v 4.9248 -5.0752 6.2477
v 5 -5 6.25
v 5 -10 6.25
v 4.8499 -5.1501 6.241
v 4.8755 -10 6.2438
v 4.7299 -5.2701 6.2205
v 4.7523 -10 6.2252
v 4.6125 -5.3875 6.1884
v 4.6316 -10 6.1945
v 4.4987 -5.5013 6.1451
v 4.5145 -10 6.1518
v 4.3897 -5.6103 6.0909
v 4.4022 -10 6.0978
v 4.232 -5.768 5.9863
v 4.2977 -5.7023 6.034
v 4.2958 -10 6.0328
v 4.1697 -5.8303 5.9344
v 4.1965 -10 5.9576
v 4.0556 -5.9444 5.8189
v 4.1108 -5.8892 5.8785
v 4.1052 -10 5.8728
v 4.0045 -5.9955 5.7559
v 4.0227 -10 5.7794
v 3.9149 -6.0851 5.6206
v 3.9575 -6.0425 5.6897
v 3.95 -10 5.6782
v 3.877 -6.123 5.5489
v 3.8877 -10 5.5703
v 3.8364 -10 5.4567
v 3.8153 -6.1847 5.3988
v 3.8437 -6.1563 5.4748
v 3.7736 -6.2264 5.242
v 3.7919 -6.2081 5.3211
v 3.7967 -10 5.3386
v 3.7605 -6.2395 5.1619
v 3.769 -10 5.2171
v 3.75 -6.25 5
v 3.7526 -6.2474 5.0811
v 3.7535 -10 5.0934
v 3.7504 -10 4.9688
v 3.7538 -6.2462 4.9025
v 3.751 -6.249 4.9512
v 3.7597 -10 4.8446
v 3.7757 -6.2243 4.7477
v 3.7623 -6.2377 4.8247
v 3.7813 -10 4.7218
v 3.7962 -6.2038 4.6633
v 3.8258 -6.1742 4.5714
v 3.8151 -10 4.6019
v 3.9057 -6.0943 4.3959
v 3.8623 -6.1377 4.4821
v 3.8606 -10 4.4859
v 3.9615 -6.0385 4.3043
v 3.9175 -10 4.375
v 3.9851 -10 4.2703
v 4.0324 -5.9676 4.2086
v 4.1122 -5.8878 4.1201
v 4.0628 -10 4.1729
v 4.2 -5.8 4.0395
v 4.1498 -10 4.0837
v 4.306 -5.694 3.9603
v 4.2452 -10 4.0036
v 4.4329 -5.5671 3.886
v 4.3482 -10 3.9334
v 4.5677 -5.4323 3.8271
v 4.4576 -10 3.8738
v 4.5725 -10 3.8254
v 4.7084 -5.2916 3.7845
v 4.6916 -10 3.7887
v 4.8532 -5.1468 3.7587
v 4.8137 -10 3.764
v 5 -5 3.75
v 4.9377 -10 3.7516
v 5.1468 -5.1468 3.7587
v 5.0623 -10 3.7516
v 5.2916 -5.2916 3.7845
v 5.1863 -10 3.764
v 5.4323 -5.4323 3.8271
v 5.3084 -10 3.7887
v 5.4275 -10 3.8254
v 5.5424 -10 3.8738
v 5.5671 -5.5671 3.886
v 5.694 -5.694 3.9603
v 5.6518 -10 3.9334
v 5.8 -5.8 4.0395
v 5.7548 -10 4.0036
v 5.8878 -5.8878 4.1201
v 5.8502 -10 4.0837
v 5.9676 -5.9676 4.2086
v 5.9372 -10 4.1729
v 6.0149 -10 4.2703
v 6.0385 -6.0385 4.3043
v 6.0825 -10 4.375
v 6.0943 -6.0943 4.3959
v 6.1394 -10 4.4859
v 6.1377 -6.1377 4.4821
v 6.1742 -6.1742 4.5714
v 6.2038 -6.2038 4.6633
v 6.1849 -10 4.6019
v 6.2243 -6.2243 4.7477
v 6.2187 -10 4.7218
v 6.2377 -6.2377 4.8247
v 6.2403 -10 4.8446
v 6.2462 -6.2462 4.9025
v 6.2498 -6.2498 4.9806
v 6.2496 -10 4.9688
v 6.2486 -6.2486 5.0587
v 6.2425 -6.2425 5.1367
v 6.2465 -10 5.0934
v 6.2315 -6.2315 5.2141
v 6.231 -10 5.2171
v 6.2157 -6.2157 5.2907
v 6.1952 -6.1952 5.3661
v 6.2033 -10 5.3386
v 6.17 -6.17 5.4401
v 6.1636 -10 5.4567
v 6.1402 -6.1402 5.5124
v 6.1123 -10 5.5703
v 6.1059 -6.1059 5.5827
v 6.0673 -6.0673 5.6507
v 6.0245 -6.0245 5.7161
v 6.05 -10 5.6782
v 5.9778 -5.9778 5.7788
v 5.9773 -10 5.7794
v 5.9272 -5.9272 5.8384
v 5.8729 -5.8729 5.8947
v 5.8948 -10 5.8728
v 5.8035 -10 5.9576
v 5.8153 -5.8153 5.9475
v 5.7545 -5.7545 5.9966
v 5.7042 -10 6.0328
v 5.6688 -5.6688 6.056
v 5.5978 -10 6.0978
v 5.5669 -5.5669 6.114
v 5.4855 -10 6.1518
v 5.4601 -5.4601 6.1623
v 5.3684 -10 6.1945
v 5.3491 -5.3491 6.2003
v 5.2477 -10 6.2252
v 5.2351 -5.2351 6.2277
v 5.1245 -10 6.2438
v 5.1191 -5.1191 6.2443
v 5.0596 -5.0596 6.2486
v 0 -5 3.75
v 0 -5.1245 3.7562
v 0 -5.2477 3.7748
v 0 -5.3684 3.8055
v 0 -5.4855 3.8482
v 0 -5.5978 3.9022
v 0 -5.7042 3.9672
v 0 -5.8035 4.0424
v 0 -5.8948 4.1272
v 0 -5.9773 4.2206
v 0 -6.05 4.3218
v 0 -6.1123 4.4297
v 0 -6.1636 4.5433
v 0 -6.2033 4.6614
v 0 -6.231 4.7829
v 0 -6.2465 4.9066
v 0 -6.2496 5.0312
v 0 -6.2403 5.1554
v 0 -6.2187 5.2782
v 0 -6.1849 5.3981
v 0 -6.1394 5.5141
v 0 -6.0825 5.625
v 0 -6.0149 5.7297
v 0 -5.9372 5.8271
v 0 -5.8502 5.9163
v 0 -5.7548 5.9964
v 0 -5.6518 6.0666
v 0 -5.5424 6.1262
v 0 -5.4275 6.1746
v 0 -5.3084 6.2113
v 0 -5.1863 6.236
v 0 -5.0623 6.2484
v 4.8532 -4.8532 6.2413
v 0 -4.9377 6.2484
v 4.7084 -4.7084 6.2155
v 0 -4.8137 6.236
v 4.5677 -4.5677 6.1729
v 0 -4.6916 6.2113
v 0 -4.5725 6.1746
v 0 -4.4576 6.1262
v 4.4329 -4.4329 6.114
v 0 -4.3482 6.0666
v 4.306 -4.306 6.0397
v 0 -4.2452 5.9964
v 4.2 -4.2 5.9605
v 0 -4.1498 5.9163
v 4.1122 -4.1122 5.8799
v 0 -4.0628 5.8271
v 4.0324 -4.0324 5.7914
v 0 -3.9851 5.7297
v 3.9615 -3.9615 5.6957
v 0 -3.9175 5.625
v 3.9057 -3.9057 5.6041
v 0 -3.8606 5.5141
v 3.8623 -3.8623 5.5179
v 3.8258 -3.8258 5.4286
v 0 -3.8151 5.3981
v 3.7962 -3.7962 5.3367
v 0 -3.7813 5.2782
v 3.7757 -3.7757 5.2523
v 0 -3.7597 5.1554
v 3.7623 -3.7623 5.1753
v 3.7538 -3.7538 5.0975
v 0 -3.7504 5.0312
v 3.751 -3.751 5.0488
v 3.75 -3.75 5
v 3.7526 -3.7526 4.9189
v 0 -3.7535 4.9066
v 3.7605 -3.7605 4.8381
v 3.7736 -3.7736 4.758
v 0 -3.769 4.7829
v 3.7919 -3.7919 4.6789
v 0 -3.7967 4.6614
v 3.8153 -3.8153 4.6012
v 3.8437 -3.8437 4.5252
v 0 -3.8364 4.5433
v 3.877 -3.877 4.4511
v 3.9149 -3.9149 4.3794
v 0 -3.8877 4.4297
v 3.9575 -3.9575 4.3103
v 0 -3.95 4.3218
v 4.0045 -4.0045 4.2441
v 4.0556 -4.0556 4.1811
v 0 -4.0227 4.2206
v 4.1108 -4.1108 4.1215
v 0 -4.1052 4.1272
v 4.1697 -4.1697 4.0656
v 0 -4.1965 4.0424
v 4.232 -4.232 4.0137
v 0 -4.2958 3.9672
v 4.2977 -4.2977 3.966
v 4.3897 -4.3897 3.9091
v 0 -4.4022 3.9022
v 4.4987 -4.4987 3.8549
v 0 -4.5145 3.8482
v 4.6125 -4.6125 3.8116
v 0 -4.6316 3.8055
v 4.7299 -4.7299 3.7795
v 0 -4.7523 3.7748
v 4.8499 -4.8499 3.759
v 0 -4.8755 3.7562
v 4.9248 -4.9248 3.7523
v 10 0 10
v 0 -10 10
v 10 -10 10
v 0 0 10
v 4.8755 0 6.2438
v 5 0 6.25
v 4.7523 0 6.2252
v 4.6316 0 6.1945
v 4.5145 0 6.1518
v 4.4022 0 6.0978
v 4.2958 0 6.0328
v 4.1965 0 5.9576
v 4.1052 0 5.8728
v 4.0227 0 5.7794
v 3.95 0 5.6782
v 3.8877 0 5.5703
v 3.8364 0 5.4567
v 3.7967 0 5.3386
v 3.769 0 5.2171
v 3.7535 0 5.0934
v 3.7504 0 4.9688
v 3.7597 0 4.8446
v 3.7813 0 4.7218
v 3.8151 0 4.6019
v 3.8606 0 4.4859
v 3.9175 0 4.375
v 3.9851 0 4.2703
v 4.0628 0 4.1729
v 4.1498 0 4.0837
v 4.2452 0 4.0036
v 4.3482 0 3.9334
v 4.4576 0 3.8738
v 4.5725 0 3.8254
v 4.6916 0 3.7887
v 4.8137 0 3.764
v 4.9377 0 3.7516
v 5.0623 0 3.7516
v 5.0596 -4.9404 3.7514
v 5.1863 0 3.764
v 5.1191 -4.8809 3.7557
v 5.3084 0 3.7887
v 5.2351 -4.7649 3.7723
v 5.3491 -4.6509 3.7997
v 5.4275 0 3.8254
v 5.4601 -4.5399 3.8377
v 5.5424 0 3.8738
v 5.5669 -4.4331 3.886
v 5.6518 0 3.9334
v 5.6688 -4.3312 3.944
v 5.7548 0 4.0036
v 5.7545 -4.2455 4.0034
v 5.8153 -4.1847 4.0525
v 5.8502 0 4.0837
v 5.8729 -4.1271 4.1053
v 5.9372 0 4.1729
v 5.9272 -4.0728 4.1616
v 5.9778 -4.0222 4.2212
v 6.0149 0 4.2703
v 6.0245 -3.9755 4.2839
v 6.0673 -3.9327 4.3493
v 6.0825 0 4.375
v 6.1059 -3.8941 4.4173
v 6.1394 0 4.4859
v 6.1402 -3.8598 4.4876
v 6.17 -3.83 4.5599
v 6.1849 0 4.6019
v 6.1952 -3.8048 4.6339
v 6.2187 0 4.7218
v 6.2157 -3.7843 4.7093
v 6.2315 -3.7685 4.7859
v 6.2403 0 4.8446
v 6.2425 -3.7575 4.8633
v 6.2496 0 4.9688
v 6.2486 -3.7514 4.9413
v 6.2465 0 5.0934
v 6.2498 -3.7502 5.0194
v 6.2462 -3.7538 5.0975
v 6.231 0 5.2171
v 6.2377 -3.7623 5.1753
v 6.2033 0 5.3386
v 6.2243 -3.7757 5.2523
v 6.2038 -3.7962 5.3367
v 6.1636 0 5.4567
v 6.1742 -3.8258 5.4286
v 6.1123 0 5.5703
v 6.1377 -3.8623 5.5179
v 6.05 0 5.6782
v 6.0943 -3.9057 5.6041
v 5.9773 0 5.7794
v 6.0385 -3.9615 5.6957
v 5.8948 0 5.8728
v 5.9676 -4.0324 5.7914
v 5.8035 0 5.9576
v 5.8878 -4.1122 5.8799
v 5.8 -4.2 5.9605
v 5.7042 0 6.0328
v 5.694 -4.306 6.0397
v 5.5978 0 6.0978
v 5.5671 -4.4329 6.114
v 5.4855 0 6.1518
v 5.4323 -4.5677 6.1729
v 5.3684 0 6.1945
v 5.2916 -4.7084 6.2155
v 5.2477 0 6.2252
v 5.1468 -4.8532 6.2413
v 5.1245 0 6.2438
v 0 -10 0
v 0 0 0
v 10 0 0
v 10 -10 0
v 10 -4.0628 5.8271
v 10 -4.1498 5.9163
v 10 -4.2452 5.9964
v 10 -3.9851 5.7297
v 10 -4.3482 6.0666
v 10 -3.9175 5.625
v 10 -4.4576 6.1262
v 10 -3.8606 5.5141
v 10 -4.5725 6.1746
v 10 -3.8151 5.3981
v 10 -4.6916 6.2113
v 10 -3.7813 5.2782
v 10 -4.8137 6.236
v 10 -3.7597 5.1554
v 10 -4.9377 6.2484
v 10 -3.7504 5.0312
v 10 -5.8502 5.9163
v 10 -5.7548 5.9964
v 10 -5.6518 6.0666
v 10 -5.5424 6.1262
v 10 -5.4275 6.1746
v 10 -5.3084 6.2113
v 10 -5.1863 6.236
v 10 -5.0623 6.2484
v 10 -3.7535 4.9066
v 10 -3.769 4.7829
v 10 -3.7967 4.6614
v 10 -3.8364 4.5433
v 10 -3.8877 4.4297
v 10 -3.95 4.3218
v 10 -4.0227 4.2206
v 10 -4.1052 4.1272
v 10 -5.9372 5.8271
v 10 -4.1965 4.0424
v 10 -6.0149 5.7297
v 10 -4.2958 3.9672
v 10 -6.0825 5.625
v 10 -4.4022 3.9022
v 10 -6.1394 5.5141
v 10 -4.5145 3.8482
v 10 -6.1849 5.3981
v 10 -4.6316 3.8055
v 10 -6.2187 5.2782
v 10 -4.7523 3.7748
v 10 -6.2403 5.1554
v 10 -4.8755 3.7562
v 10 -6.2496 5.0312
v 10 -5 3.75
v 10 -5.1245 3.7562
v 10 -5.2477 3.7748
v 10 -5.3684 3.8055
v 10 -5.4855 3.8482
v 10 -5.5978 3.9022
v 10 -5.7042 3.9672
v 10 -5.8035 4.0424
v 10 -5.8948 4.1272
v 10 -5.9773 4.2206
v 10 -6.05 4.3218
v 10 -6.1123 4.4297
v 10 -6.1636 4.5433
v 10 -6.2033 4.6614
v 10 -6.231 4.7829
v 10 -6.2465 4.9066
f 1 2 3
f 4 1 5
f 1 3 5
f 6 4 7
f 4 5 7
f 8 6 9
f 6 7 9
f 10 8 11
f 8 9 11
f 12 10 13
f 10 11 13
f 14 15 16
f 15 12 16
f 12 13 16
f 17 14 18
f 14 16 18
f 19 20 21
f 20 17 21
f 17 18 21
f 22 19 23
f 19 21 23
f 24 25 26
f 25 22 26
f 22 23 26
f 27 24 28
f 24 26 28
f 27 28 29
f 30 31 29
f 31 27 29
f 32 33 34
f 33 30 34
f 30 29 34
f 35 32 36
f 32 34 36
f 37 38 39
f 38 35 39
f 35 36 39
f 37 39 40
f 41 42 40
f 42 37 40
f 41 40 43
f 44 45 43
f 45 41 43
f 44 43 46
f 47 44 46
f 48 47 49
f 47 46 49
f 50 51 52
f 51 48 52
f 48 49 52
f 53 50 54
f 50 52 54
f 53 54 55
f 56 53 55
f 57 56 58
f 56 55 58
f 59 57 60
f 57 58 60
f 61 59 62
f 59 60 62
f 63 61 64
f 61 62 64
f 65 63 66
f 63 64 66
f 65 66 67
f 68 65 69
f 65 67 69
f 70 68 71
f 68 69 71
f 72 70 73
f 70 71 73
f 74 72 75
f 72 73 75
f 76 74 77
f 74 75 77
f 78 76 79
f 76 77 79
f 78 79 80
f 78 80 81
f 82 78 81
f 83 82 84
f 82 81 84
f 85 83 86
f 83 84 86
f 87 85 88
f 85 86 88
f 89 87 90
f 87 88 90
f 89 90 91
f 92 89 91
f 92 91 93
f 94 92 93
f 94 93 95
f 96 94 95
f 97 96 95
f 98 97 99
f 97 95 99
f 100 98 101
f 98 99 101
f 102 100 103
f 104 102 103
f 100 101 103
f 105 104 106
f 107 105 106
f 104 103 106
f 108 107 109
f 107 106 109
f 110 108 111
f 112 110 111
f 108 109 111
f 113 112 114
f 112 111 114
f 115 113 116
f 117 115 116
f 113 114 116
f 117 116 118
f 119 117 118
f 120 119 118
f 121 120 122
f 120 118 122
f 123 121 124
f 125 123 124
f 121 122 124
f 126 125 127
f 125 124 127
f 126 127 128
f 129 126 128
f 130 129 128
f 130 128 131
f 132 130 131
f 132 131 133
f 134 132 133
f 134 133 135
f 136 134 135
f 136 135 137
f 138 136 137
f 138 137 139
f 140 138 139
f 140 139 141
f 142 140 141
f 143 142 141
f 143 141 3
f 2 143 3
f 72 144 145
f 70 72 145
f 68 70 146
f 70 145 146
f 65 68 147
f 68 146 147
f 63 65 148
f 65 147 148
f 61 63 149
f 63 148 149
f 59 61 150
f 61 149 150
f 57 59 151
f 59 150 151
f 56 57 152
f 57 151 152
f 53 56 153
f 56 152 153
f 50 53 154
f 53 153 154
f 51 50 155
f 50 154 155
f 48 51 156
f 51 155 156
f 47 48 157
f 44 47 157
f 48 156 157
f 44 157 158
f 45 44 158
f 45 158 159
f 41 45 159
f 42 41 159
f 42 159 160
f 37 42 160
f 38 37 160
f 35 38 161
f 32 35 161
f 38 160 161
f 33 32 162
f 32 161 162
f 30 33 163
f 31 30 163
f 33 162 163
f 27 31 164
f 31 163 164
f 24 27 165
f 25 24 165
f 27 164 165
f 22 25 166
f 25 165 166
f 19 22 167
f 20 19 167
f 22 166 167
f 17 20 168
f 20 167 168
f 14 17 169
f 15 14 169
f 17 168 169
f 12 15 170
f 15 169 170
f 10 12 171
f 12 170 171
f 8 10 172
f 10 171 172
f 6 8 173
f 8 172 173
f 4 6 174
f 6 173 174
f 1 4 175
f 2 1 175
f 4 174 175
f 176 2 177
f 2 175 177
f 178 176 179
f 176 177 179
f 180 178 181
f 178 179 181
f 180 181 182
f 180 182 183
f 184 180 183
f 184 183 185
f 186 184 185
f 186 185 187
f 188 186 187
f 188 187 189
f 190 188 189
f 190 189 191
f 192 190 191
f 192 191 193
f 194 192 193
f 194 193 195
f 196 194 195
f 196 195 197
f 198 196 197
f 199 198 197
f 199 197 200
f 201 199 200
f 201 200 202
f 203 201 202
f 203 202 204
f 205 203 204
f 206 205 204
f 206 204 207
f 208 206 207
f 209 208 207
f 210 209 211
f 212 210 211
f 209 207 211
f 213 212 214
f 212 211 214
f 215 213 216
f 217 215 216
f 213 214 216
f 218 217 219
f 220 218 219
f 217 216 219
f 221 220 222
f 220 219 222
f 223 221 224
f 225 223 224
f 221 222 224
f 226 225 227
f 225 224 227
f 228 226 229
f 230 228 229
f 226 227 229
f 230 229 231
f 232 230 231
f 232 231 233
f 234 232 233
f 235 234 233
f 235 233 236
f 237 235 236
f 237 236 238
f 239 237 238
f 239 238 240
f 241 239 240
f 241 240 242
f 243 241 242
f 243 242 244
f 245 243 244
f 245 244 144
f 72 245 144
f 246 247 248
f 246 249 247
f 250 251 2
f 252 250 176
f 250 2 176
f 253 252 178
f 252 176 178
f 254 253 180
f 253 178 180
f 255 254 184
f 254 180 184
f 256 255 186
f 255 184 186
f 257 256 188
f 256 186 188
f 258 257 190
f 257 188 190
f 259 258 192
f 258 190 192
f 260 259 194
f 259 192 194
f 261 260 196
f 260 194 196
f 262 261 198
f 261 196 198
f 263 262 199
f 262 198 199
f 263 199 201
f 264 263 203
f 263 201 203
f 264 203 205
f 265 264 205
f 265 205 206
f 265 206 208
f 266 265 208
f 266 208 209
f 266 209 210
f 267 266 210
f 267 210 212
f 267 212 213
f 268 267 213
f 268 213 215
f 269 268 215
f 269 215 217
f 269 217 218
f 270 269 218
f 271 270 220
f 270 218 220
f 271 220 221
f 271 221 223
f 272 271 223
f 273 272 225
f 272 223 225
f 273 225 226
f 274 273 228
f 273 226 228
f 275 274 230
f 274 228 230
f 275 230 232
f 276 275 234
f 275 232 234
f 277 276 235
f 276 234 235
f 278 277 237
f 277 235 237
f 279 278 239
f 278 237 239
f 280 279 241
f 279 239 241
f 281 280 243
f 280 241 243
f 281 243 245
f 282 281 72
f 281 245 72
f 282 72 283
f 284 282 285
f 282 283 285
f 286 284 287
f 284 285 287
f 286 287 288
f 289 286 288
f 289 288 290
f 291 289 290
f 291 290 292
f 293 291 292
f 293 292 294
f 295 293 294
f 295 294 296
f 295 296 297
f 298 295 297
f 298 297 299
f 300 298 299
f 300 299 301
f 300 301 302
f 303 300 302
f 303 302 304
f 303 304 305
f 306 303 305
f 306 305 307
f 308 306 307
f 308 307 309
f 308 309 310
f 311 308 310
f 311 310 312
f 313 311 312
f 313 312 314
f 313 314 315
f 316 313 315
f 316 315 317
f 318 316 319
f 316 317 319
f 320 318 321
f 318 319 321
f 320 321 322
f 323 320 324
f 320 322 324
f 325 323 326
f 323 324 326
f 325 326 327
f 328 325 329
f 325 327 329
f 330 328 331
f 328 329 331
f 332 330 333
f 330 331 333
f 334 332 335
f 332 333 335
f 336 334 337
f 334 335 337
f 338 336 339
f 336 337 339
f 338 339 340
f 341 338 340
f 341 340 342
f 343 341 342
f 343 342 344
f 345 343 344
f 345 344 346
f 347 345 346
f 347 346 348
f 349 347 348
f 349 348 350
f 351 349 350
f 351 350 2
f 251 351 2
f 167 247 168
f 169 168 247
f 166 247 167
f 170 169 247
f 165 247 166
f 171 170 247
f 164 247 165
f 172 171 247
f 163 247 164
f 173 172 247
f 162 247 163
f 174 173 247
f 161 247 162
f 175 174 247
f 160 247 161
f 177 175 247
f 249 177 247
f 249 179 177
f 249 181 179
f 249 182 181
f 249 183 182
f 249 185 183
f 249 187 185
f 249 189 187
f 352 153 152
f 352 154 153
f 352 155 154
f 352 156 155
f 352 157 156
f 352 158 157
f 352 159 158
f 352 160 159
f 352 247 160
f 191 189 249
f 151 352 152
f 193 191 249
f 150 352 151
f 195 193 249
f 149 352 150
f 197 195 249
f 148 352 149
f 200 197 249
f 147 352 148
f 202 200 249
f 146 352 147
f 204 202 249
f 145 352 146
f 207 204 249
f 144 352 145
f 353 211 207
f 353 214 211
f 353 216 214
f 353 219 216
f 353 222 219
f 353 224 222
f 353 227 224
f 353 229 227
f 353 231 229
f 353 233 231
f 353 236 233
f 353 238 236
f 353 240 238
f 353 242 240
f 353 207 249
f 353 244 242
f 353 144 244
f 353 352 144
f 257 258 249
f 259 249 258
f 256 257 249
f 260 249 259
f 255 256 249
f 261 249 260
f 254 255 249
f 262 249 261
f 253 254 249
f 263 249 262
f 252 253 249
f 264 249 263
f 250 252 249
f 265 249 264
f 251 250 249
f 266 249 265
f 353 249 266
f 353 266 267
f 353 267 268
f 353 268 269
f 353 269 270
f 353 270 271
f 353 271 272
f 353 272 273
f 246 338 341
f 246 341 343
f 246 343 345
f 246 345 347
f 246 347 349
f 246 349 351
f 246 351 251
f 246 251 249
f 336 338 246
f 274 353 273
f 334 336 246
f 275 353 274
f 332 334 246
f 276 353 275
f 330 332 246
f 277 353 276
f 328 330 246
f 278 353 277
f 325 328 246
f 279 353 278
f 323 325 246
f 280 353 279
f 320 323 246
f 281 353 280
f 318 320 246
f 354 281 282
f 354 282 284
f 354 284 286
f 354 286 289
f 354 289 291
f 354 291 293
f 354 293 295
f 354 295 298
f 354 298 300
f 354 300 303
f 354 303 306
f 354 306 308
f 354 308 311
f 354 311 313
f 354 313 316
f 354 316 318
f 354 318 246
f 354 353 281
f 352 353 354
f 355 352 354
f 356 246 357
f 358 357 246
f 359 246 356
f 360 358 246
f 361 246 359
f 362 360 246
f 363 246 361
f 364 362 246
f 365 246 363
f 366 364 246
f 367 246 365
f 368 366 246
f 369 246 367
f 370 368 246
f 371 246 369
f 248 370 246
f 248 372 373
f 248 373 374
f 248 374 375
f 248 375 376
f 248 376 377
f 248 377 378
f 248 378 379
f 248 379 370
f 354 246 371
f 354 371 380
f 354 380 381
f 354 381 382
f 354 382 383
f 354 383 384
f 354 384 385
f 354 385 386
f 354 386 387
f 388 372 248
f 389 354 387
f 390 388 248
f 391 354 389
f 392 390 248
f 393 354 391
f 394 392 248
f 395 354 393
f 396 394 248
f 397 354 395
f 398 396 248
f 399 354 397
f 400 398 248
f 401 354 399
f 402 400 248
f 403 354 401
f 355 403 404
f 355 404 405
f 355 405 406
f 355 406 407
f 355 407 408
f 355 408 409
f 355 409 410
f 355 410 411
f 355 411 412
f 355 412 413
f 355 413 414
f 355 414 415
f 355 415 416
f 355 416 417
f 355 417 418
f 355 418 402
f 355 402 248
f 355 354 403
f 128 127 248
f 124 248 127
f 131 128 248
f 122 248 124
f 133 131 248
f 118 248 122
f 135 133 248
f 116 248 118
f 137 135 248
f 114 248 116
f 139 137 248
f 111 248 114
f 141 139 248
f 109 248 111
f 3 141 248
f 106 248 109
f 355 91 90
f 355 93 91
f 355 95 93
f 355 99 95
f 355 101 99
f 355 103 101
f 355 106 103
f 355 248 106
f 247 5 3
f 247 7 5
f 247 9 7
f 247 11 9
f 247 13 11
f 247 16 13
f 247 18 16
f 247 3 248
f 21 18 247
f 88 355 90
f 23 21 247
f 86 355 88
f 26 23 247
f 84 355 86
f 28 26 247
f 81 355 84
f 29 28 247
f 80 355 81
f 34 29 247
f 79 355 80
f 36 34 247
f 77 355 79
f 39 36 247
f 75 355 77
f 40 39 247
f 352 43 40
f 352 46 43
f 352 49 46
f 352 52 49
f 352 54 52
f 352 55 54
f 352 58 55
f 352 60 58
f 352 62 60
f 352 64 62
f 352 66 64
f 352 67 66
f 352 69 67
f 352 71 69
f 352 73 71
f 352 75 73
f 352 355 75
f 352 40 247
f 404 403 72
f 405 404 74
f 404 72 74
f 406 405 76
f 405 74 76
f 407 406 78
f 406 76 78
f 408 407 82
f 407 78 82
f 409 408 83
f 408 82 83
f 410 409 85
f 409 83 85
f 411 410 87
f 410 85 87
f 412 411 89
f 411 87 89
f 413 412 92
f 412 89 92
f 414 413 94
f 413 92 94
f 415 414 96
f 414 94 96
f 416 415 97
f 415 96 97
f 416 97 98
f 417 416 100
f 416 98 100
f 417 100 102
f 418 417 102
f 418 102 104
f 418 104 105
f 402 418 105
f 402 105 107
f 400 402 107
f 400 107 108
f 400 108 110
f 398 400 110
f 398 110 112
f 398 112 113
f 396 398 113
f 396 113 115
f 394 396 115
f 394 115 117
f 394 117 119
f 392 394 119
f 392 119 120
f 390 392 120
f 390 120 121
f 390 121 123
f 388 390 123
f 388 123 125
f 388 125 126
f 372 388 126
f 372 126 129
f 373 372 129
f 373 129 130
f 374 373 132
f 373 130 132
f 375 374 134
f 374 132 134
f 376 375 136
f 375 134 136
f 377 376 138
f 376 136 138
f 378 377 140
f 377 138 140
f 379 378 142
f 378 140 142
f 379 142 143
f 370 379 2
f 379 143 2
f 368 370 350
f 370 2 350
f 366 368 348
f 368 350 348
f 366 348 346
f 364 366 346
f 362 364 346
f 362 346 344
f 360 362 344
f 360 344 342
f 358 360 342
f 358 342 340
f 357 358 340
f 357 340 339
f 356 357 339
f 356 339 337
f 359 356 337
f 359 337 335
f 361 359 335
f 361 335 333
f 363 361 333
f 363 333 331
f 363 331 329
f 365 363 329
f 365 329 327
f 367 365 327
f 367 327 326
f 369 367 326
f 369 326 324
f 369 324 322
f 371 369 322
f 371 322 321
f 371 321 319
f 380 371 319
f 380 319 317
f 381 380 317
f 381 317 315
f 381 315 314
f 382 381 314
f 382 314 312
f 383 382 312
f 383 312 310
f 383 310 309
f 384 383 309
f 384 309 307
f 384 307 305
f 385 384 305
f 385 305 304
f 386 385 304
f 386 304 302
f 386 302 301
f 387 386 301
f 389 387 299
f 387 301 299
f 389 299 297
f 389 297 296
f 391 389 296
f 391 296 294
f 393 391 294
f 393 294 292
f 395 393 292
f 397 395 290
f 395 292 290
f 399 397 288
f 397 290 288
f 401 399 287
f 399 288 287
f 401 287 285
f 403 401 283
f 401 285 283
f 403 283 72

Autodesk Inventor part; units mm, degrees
ref_plane "YZ Plane" through (0, 0, 0) normal (1, 0, 0) x (0, 1, 0)
ref_plane "XZ Plane" through (0, 0, 0) normal (0, 1, 0) x (-1, 0, 0)
ref_plane "XY Plane" through (0, 0, 0) normal (0, 0, 1) x (1, 0, 0)
sketch "スケッチ1" plane through (0, 0, 0) normal (0, 0, 1) x (1, 0, 0)
  line L0 (0, 0) -> (10, 0)
  line L1 (10, 0) -> (10, -10)
  line L2 (10, -10) -> (0, -10)
  line L3 (0, -10) -> (0, 0)
  line L4 (0, -5) -> (10, -5)
  line L5 (5, 0) -> (5, -10)
  dimension "d0" = 10
  dimension "d1" = 10
extrude "押し出し1" add sketch "スケッチ1" along normal blind 10
sketch "スケッチ2" plane through (10, -10, 0) normal (1, 0, 0) x (0, 0, -1)
  line L0 (-10, 10) -> (0, 10) projected
  line L1 (0, 10) -> (0, 0) projected
  line L2 (0, 0) -> (-10, 0) projected
  line L3 (-10, 0) -> (-10, 10) projected
  line L4 (-10, 10) -> (0, 0)
  line L5 (0, 10) -> (0, 0) projected
  line L6 (-10, 0) -> (0, 10)
  point P0 (-5, 5)
hole "穴1" at (10, -5, 5) direction (-1, 0, 0) diameter 2.5 end through all
sketch "スケッチ3" plane through (0, 0, 0) normal (0, 1, 0) x (1, 0, 0)
  line L0 (10, 0) -> (10, -10) projected
  line L1 (10, -10) -> (0, -10) projected
  line L2 (0, -10) -> (0, 0) projected
  line L3 (0, 0) -> (10, 0) projected
  line L4 (0, -10) -> (10, 0)
  line L5 (10, 0) -> (10, -10) projected
  line L6 (0, 0) -> (10, 0) projected
  line L7 (10, -10) -> (0, 0)
  point P0 (5, -5)
hole "穴2" at (5, 0, 5) direction (0, -1, 0) diameter 2.5 end through all
properties part number "垂直ブロック 樹脂 10" material "PPS プラスチック"
